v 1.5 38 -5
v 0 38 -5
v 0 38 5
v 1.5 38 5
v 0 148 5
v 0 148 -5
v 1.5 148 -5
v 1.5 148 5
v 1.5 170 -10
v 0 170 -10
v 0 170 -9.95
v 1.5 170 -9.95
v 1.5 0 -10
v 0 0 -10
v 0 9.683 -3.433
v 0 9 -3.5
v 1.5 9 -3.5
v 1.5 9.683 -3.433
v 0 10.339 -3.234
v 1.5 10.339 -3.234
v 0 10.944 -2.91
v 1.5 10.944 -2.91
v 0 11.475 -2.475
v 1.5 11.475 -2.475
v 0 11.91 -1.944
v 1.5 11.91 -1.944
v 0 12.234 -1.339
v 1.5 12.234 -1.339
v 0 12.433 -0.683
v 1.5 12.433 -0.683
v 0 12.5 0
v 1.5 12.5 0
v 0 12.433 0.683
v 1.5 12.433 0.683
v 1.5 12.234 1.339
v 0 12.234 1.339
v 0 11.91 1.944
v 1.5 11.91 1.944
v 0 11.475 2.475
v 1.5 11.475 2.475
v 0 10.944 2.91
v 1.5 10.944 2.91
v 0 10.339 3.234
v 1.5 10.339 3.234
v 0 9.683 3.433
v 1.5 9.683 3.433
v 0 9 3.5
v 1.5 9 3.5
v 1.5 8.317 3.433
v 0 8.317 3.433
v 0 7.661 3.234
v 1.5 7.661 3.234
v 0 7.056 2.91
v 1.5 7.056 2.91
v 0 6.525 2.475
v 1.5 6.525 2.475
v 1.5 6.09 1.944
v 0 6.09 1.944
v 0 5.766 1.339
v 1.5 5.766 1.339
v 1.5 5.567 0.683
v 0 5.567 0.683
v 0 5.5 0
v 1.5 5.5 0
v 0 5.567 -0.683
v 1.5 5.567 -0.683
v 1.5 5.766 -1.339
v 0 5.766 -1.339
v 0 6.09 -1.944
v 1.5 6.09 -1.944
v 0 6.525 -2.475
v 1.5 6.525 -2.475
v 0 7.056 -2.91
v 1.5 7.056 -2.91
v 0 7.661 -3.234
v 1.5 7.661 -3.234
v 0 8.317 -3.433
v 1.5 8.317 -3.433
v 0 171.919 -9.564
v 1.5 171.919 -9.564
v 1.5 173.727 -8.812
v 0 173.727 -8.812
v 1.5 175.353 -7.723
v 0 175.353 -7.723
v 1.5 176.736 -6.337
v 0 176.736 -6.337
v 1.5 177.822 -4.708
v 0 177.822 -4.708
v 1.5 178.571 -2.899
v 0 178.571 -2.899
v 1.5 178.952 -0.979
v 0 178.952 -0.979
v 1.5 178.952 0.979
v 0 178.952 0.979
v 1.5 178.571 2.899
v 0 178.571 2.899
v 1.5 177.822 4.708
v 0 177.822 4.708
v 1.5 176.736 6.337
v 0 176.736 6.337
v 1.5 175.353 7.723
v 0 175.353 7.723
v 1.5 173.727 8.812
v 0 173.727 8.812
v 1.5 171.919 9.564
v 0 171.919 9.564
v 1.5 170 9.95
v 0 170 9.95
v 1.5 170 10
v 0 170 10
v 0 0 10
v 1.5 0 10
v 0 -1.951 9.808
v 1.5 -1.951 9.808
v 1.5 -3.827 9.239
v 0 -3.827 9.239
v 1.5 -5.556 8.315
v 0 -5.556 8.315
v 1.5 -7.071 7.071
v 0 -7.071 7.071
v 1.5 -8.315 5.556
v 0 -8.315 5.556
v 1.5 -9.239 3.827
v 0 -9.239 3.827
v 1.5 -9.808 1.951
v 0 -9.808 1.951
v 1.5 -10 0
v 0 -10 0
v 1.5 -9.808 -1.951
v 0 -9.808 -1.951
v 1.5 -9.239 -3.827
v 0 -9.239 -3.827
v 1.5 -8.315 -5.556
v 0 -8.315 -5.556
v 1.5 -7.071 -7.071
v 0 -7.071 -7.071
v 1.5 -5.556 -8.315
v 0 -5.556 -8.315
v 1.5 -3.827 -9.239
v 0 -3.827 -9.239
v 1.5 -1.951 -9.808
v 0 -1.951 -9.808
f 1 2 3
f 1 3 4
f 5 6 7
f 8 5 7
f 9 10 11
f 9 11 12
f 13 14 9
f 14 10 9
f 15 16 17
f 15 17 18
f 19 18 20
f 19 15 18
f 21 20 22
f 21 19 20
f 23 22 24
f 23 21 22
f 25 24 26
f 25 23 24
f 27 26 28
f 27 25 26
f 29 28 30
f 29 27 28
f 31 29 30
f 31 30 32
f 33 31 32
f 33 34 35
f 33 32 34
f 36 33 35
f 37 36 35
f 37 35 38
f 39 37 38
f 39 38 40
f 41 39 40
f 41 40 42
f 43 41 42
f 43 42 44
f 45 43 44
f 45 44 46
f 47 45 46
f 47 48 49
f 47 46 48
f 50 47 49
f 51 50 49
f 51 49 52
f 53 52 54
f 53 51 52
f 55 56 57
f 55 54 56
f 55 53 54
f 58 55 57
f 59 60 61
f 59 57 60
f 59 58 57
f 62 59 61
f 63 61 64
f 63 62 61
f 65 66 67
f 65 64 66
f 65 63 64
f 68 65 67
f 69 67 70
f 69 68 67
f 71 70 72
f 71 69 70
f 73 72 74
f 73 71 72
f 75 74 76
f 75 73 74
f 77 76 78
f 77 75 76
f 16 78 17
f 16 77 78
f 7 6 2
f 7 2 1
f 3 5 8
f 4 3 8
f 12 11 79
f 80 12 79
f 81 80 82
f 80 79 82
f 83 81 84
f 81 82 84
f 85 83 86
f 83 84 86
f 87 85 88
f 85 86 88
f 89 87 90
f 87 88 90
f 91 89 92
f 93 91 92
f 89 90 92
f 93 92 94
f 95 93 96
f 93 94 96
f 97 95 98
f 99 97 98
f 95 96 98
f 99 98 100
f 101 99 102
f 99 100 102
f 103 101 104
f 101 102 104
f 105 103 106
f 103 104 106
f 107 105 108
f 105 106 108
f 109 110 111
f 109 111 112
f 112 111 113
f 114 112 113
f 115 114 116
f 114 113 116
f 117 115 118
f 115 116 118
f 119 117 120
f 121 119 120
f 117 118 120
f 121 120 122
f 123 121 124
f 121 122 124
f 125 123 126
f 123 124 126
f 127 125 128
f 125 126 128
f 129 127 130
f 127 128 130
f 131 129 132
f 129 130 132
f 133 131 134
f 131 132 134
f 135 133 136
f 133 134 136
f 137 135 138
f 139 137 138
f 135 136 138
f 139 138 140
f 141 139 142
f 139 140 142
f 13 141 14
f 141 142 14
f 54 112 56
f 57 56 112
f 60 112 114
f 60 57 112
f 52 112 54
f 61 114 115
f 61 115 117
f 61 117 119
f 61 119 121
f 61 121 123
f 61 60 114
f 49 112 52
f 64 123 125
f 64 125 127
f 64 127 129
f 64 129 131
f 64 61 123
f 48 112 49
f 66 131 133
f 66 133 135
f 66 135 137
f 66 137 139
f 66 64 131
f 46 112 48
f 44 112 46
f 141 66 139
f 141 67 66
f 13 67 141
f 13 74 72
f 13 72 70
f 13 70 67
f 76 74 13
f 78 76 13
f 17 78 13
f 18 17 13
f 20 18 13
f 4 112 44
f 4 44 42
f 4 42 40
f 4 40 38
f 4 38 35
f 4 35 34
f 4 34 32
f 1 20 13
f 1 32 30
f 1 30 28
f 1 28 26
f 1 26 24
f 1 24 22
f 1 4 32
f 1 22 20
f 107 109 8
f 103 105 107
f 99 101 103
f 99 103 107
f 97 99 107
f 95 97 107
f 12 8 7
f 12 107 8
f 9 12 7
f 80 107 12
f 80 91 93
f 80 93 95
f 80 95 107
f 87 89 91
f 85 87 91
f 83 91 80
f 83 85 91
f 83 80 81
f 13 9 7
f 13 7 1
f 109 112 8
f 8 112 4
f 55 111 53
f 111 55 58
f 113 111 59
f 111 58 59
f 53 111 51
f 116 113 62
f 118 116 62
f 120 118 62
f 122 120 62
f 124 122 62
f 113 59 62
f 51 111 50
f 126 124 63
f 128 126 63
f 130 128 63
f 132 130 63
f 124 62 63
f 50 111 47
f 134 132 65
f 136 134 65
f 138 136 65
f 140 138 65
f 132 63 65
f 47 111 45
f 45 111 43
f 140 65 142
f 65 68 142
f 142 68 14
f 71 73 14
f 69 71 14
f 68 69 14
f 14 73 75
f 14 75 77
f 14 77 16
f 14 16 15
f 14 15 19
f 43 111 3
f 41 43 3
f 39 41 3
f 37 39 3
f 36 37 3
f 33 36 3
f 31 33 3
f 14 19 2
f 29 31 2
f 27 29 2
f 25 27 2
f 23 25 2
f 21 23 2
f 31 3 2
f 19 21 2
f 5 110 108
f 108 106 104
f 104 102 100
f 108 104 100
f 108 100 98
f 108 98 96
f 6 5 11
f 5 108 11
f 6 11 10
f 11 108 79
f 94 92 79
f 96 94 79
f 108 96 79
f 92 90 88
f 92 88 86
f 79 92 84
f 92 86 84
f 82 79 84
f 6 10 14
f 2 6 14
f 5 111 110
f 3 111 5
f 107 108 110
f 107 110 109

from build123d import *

# Parameters (mm, degrees)
CYLINDER004_R     = 3.5
CYLINDER004_DEPTH = 10
BOX004_W          = 10
BOX004_H          = 110
BOX004_DEPTH      = 10
CYLINDER003_R     = 10
CYLINDER003_DEPTH = 1.5
BOX002_W          = 1.5
BOX002_H          = 170
BOX002_DEPTH      = 20
CYLINDER002_R     = 10
CYLINDER002_DEPTH = 1.5


with BuildPart() as pwrjack:
    # Cylinder004 → Cylinder004 (new body)
    with BuildSketch(Plane(origin=(-3, 9, 0), x_dir=(0, 0, -1), z_dir=(1, 0, 0))):
        Circle(CYLINDER004_R)
    extrude(amount=CYLINDER004_DEPTH)


with BuildPart() as cube003:
    # Box004 → Box004 (new body)
    with BuildSketch(Plane(origin=(-3, 38, -5), x_dir=(1, 0, 0), z_dir=(0, 0, 1))):
        with Locations((5, 55)):
            Rectangle(BOX004_W, BOX004_H)
    extrude(amount=BOX004_DEPTH)


with BuildPart() as cylinder003:
    # Cylinder003 → Cylinder003 (new body)
    with BuildSketch(Plane(origin=(0, 169, 0), x_dir=(0, 0, -1), z_dir=(1, 0, 0))):
        Circle(CYLINDER003_R)
    extrude(amount=CYLINDER003_DEPTH)


with BuildPart() as cube002:
    # Box002 → Box002 (new body)
    with BuildSketch(Plane.XY.offset(-10)):
        with Locations((0.75, 85)):
            Rectangle(BOX002_W, BOX002_H)
    extrude(amount=BOX002_DEPTH)


with BuildPart() as cut003:
    # Cylinder002 → Cylinder002 (new body)
    with BuildSketch(Plane(origin=(0, 0, 0), x_dir=(0, 0, -1), z_dir=(1, 0, 0))):
        Circle(CYLINDER002_R)
    extrude(amount=CYLINDER002_DEPTH)

    # Fusion001: union Cylinder003, Cube002
    add(cylinder003.part)
    add(cube002.part)

    # Cut001: cut Cube003
    add(cube003.part, mode=Mode.SUBTRACT)

    # Cut003: cut pwrjack
    add(pwrjack.part, mode=Mode.SUBTRACT)


solid = cut003.part
